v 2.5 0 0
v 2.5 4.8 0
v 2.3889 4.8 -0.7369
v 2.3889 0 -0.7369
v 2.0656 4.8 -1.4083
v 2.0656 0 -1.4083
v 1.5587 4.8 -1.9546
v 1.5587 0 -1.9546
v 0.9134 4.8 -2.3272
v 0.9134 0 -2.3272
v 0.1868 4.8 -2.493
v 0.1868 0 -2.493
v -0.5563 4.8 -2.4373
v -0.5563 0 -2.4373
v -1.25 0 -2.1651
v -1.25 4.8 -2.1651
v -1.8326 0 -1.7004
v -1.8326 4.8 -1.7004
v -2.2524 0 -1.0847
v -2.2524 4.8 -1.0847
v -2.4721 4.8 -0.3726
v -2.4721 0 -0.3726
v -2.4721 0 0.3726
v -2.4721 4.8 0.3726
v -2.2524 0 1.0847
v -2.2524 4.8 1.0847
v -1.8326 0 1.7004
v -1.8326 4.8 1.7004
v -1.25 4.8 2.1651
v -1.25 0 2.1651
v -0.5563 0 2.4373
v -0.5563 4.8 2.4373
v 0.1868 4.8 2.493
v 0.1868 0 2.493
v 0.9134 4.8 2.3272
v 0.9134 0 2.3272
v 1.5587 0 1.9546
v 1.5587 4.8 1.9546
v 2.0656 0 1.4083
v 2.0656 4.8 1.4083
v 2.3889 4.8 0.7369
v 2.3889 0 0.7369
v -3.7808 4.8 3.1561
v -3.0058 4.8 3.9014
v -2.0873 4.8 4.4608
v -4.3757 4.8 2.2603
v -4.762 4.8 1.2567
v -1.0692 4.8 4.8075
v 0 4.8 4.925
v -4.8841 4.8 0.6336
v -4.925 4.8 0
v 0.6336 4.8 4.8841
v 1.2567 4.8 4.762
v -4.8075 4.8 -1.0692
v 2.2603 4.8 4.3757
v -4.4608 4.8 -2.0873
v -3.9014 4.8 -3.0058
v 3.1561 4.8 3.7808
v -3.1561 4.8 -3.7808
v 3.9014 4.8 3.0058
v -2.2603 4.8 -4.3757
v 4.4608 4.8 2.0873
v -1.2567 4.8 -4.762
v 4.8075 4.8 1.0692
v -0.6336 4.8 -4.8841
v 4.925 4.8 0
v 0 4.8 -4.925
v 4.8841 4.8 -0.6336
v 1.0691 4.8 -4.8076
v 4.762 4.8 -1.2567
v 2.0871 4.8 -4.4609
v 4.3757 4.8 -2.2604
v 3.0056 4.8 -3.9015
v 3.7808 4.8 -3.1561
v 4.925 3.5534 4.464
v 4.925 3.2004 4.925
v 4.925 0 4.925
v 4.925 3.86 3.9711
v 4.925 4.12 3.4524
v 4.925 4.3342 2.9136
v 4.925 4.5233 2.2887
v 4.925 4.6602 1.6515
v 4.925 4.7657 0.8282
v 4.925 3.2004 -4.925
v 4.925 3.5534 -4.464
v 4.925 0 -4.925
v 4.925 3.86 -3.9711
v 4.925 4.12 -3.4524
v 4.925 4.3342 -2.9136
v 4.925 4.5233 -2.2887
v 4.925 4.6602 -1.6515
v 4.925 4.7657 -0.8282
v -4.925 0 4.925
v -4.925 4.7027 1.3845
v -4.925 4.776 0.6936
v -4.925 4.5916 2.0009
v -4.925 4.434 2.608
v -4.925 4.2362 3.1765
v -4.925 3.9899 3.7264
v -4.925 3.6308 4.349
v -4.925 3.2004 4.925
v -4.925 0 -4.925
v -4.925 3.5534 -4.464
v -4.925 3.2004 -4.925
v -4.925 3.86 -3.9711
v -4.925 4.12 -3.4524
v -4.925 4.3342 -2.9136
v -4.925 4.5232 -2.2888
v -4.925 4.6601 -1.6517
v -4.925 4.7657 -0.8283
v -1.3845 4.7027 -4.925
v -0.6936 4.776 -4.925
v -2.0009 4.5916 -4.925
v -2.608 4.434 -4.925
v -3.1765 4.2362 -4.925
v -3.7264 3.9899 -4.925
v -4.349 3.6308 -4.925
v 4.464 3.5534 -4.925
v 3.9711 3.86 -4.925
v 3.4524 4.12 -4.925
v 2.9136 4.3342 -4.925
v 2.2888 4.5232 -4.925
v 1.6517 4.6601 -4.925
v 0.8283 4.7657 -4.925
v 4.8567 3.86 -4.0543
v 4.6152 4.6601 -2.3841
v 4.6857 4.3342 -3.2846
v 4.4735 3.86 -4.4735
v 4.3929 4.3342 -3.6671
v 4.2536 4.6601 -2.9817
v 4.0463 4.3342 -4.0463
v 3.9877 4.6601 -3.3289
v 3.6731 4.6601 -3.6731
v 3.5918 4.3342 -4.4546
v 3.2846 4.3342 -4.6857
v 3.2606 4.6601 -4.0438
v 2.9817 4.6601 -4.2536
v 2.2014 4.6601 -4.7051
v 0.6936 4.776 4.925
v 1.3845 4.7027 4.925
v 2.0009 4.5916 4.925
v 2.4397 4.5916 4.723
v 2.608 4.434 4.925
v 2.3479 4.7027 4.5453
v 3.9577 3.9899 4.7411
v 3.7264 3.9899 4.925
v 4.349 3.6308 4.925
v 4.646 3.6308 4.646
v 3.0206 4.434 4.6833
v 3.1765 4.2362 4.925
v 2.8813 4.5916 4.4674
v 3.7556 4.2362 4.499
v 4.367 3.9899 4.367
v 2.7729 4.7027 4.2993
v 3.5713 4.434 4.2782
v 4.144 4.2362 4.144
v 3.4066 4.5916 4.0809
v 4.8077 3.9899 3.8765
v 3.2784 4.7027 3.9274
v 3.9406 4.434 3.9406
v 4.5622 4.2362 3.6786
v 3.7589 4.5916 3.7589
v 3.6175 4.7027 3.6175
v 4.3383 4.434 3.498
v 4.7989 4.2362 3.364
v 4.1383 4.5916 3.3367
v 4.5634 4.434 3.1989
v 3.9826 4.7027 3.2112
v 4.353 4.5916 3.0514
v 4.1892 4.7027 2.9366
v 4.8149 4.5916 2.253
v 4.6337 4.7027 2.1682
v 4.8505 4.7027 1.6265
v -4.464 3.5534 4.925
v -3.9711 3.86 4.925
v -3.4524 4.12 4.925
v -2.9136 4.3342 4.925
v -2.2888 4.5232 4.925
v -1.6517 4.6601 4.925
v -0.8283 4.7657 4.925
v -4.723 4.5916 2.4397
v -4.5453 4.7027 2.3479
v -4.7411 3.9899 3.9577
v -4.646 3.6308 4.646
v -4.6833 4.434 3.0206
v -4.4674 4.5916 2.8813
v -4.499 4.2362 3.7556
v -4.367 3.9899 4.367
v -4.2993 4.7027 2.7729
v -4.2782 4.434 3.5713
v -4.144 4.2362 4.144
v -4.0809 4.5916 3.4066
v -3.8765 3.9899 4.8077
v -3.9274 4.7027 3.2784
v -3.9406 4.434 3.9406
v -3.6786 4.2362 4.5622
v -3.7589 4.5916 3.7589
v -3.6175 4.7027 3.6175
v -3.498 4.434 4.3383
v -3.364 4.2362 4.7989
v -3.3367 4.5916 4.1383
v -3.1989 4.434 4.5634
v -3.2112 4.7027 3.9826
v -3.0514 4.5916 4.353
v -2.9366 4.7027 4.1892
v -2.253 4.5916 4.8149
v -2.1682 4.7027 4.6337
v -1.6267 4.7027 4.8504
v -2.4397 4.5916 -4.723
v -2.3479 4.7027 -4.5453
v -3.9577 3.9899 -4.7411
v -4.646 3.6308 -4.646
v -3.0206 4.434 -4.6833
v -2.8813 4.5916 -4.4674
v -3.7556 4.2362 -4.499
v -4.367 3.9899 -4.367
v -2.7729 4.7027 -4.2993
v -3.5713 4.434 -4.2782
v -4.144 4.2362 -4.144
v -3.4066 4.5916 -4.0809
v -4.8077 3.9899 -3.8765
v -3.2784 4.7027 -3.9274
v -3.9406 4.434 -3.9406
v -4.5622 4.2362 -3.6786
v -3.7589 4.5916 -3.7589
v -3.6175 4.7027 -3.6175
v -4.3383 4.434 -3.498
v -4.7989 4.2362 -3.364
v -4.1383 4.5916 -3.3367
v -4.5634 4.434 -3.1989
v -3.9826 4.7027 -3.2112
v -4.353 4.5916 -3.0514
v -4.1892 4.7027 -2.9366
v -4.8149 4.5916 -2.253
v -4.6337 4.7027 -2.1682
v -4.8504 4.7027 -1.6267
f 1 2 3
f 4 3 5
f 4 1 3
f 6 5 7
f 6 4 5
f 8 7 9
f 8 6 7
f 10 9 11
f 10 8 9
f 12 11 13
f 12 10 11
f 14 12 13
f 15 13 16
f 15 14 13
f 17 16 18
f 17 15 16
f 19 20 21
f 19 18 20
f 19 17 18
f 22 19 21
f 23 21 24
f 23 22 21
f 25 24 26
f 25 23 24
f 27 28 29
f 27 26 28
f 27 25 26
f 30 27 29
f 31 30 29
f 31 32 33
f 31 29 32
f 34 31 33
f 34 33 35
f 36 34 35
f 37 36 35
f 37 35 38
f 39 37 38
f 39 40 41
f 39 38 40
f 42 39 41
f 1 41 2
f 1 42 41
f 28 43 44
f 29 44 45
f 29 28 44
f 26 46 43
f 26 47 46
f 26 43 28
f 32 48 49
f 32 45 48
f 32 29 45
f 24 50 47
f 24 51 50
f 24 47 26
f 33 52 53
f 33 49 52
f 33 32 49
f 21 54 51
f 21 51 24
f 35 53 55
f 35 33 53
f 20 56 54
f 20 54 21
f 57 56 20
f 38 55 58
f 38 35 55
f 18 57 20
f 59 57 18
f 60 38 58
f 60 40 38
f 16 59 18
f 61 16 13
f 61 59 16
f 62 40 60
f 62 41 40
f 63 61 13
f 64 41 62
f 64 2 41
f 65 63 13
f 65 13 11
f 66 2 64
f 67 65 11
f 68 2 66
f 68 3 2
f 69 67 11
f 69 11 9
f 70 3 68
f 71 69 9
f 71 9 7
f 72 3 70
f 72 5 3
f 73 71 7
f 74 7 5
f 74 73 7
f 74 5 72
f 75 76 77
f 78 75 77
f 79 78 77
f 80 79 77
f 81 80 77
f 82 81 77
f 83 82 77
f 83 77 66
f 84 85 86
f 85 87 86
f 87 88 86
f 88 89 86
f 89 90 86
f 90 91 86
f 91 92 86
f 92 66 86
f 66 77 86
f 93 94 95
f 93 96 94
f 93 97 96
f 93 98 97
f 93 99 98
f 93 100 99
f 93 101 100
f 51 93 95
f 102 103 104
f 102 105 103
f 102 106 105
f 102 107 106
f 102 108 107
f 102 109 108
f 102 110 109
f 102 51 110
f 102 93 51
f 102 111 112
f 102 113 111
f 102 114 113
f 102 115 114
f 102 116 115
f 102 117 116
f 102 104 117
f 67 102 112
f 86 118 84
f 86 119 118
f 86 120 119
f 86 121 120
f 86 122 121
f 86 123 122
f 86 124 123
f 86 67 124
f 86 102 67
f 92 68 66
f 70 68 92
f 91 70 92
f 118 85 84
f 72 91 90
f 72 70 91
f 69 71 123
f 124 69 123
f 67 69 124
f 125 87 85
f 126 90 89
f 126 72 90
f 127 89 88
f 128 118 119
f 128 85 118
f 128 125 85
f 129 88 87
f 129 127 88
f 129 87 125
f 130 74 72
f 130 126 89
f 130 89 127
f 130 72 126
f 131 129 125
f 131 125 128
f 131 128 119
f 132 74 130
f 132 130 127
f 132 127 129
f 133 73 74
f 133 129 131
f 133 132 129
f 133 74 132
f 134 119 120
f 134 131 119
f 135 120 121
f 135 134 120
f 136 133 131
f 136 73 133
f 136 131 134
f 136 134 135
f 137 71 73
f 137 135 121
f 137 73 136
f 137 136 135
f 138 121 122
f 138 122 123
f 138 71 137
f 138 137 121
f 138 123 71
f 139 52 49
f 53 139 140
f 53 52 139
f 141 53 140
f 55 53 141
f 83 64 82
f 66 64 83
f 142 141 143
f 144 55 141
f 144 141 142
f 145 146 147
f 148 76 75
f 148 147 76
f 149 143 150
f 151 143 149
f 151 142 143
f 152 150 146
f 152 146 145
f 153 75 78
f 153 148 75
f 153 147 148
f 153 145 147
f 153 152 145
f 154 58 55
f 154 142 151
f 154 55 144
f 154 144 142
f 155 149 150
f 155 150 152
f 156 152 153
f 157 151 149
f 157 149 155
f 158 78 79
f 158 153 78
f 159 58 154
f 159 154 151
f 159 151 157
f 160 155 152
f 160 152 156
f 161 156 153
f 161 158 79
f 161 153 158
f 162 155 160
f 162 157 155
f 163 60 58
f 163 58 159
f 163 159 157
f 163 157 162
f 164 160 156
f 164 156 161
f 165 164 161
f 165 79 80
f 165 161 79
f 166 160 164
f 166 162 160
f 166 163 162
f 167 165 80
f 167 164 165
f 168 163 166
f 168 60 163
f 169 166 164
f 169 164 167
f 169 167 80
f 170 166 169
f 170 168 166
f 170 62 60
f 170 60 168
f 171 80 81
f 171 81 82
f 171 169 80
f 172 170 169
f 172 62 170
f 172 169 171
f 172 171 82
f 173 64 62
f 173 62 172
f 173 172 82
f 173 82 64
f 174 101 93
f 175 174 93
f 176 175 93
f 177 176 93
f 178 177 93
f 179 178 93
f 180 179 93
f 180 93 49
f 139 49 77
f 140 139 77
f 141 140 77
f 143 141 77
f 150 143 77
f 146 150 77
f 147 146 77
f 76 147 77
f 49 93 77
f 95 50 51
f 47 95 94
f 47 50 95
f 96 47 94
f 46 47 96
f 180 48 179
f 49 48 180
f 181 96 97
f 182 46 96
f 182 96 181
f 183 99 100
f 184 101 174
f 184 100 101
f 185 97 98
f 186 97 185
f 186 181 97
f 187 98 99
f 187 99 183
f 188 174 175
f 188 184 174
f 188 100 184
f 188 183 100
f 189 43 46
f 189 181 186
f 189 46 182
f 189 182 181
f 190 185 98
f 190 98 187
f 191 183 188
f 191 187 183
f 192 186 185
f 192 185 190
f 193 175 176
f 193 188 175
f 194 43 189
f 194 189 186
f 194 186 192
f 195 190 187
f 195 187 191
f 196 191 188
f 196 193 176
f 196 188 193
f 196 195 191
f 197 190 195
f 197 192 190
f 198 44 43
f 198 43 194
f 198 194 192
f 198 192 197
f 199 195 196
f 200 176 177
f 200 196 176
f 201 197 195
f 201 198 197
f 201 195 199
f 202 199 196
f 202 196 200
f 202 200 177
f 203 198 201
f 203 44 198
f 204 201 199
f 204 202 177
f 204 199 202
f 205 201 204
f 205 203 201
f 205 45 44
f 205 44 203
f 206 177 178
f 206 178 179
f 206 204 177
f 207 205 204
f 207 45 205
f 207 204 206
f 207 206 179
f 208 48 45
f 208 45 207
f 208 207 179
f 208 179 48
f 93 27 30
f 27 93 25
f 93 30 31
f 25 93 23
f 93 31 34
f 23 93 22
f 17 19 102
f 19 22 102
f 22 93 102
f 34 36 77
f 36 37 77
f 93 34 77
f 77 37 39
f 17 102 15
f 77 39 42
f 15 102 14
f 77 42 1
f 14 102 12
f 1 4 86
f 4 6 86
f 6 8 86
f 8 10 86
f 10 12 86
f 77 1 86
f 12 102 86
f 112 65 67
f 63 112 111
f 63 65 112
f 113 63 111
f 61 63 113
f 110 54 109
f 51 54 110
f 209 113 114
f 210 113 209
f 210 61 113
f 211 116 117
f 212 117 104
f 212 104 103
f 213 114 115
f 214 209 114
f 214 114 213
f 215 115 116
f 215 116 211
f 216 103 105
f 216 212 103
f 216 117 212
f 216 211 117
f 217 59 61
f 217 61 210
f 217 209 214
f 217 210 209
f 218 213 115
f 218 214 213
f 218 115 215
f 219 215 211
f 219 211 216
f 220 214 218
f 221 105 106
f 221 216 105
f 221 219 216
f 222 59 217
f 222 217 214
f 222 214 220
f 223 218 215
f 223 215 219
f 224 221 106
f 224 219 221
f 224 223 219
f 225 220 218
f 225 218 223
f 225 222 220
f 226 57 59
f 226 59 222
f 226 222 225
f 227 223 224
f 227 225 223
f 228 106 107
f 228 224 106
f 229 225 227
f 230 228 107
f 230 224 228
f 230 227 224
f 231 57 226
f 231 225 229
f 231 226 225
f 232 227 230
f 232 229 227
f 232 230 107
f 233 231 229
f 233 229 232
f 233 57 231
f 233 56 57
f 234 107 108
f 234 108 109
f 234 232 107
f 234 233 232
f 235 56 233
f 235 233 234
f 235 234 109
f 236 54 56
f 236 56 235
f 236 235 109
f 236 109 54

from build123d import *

# Parameters (mm, degrees)
SKETCH1_W               = 9.85
SKETCH1_H               = 9.85
BOSS_EXTRUDE1_DEPTH     = 4.8
SKETCH2_R               = 2.5
CUT_EXTRUDE2_DEPTH      = 5.8
CUT_EXTRUDE2_DEPTH_BACK = 1


with BuildPart() as part:
    # Sketch1 → Boss-Extrude1 (new body)
    with BuildSketch(Plane(origin=(0, 0, 0), x_dir=(1, 0, 0), z_dir=(0, 1, 0))):
        Rectangle(SKETCH1_W, SKETCH1_H)
    extrude(amount=BOSS_EXTRUDE1_DEPTH)

    # Sketch2 → Cut-Extrude2 (cut, two sides)
    with BuildSketch(Plane(origin=(0, 0, 0), x_dir=(1, 0, 0), z_dir=(0, 1, 0))) as cut_extrude2_sk:
        Circle(SKETCH2_R)
    extrude(amount=CUT_EXTRUDE2_DEPTH, mode=Mode.SUBTRACT)
    extrude(cut_extrude2_sk.sketch, amount=-CUT_EXTRUDE2_DEPTH_BACK, mode=Mode.SUBTRACT)

    # Sketch4 → Cut-Revolve3 (revolve, cut)
    with BuildSketch(Plane.XY):
        with BuildLine():
            Line((4.377231808, 5.035384903), (7.488107991, 5.035384903))
            Line((7.488107991, 5.035384903), (7.488107991, 2.471192453))
            ThreePointArc((7.488107991, 2.471192453), (6.147264146, 4.013634243), (4.377231808, 5.035384903))
        make_face()
    revolve(axis=Axis((0, 0, 0), (0, 1, 0)), mode=Mode.SUBTRACT)


solid = part.part
